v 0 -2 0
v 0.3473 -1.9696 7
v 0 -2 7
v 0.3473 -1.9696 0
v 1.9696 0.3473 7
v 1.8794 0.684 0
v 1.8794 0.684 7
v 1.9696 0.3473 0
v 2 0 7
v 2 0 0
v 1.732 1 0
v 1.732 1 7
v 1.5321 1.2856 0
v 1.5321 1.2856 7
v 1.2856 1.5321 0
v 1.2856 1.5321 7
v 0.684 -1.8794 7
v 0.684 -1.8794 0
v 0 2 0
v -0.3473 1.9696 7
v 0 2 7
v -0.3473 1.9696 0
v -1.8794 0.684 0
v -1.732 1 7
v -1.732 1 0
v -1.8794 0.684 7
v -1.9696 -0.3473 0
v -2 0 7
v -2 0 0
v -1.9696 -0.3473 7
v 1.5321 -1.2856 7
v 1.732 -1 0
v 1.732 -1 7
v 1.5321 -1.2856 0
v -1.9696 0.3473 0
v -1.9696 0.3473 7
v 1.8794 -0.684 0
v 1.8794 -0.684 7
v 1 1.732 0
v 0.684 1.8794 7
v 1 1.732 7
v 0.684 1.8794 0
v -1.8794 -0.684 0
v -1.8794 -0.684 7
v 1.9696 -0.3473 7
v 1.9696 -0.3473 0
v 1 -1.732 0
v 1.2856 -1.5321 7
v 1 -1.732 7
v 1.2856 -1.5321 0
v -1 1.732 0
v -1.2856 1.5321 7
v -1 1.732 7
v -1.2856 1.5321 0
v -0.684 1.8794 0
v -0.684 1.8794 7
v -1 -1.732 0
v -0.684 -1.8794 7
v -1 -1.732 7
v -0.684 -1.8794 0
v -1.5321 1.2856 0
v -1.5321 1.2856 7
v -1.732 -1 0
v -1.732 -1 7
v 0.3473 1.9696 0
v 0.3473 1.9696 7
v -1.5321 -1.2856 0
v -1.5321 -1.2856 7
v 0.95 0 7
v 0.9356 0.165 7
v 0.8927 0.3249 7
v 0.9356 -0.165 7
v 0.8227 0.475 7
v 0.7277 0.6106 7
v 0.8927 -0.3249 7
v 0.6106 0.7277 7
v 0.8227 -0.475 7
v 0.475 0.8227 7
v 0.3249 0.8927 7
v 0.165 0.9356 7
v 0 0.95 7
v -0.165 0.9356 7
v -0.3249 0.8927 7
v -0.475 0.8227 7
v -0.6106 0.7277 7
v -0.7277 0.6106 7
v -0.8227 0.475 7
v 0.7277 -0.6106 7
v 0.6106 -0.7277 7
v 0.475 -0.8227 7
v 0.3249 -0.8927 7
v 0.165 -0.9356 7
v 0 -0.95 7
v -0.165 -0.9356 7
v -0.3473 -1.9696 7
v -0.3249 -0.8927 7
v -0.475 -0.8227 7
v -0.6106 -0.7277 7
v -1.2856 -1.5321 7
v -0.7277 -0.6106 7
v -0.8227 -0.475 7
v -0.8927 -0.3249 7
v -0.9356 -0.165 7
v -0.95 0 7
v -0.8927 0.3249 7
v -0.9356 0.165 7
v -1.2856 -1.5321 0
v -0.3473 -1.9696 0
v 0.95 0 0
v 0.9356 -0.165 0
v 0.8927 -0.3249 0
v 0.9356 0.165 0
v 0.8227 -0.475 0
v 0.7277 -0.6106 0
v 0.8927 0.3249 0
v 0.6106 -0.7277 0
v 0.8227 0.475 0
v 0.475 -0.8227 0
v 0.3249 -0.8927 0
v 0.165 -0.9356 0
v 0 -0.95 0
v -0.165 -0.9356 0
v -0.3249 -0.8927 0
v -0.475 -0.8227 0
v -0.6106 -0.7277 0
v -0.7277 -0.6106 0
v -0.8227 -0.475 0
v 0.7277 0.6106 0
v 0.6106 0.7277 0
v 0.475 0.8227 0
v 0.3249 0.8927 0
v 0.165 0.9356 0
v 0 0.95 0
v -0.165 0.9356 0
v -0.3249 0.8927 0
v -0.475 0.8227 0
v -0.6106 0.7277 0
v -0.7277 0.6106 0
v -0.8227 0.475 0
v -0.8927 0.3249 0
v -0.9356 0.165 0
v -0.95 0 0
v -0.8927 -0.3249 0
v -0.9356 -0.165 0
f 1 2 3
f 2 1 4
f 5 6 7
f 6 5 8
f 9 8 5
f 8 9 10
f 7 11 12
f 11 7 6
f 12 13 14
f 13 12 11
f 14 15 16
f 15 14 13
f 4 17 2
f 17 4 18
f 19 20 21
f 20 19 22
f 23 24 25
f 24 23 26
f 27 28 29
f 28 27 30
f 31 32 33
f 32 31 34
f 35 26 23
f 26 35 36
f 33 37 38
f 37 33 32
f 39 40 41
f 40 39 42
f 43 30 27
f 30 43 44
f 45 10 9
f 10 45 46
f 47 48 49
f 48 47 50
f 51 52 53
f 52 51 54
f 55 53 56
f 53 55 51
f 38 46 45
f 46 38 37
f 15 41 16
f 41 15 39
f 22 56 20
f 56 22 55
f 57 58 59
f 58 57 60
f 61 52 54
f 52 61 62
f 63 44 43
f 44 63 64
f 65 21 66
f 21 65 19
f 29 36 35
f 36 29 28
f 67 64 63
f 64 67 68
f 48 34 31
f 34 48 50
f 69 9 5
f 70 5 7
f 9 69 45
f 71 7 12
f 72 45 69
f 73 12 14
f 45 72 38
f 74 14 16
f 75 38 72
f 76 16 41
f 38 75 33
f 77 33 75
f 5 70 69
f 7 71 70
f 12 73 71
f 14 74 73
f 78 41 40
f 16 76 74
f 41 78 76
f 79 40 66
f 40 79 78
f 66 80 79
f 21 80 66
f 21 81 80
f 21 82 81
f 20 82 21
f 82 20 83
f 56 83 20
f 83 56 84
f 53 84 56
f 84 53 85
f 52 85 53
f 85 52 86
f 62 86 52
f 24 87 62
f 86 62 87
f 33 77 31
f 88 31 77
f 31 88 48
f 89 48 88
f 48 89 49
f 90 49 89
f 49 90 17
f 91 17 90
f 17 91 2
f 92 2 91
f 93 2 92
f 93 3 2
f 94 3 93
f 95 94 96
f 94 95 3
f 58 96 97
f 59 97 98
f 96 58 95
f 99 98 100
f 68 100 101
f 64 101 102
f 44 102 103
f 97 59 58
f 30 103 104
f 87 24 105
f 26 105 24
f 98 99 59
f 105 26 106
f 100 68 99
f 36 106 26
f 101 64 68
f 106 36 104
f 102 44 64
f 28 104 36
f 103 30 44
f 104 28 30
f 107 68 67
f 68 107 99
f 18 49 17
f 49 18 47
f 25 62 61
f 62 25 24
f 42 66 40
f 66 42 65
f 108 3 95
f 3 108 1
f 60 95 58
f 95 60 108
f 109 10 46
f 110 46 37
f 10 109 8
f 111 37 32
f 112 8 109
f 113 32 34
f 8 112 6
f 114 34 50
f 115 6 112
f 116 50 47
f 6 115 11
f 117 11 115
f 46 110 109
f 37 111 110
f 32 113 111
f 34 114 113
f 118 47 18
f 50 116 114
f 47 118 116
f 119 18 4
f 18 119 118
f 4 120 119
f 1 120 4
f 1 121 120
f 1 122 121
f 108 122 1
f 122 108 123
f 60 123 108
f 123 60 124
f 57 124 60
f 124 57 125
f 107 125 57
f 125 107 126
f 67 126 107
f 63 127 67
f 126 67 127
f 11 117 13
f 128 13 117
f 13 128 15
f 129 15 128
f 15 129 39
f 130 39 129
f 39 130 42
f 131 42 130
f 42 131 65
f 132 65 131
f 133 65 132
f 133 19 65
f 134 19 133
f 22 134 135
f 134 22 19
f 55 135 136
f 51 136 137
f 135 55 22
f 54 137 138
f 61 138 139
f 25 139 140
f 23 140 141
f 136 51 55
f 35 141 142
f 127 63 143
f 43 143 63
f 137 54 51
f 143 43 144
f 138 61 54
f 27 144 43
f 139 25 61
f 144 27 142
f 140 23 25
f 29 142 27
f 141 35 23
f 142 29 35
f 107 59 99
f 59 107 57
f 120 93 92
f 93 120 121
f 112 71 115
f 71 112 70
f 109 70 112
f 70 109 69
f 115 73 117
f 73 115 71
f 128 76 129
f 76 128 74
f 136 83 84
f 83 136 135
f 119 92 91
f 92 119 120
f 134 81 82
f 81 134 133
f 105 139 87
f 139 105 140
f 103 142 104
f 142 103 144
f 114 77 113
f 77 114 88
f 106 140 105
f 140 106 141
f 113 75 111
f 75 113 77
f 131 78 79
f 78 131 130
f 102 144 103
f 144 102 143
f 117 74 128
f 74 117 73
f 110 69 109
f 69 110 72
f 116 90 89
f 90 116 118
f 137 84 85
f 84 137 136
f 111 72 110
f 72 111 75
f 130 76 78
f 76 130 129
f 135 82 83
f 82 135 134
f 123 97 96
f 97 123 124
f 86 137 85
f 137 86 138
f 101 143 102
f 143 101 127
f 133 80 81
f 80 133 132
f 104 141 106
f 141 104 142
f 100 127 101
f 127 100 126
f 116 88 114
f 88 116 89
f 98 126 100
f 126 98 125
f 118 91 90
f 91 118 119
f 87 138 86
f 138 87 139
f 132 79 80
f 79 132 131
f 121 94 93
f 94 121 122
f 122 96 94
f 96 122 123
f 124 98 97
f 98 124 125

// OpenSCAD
// file: move.scad
// move does a translate and rotate, but with named
// parameters so you can just focus on the one thing you need.
module move(x=0,y=0,z=0,rx=0,ry=0,rz=0)
{ translate([x,y,z])rotate([rx,ry,rz]) children(); }
// main file
include <move.scad>

// This is a simple tube (a cylinder with a cylindrical hollow)

// tube(h, od, id)
// h = height of the tube 
// od = 2*or = outer radius
// id = 2*ir = inner radius
// $fn = obeys face numbers

module tube(h, od, id, $fn=$fn)
{
    difference()
    {
        cylinder(h, od/2, od/2);
        
        translate([0,0,-0.5])
        cylinder(h+1, id/2, id/2);
    };
};


tube(7, 4, 1.9, $fn=36);
